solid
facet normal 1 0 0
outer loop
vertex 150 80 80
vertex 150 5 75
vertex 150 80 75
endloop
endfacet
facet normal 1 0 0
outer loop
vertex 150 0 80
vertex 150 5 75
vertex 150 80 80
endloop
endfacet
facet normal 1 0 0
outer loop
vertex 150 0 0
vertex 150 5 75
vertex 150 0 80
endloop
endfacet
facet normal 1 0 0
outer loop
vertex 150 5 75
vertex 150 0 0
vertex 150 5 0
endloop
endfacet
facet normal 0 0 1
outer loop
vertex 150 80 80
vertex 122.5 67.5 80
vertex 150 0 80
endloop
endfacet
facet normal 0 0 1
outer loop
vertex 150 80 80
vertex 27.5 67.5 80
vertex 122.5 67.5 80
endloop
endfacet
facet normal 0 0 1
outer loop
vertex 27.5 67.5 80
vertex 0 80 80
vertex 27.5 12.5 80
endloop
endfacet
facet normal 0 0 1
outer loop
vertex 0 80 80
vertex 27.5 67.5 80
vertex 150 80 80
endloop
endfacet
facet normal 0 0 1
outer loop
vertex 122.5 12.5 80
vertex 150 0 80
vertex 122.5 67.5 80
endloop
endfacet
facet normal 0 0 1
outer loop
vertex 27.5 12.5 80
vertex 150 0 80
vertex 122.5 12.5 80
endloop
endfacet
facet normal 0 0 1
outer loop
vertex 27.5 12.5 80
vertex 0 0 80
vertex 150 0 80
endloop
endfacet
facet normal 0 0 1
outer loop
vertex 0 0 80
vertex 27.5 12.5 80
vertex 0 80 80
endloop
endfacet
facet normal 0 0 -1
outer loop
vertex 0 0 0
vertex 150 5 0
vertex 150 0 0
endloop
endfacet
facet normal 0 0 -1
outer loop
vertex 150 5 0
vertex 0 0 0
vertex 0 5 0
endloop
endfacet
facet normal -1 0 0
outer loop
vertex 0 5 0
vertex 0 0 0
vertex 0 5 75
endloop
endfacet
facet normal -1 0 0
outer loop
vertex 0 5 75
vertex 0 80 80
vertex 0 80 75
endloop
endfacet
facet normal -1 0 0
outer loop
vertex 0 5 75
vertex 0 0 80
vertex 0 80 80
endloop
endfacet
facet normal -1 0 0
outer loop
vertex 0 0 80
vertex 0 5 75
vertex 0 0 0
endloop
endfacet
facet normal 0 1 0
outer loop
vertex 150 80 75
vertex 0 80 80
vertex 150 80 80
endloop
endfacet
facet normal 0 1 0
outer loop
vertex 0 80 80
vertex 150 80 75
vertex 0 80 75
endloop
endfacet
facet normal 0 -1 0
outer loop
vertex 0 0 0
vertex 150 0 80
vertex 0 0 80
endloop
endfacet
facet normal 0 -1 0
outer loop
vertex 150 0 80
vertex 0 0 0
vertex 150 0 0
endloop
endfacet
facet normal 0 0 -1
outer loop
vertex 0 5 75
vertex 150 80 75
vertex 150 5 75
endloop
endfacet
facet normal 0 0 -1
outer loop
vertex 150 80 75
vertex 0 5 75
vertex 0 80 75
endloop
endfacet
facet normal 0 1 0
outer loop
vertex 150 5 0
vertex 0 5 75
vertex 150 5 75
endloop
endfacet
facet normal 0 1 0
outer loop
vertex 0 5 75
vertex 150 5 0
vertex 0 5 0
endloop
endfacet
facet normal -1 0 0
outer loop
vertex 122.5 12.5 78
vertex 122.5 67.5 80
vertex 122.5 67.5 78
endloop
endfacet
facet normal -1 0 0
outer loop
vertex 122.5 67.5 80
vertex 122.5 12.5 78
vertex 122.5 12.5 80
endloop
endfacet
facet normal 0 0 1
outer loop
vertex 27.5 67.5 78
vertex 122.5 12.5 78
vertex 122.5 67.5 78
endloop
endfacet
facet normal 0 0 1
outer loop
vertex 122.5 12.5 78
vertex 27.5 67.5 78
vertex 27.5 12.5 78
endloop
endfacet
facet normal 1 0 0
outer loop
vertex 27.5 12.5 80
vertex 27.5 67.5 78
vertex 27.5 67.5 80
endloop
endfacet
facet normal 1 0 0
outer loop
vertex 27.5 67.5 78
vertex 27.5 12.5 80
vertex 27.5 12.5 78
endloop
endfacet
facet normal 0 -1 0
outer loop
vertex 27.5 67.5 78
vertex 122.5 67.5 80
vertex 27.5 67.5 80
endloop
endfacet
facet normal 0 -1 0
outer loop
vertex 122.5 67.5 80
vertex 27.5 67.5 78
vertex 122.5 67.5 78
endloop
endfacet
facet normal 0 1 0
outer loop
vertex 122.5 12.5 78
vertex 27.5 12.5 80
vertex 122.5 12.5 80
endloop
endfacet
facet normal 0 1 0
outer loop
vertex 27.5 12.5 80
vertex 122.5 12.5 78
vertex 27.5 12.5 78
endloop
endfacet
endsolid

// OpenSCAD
BoxH=80;
BoxW=150;
BoxD=80;
cutH=BoxH+10;
cutW=BoxW+10;
cutD=BoxD+10;
slotH=3;
slotW=95;
slotD=55;

difference()
{
  cube([BoxW,BoxD,BoxH]);
  translate([-5,5,-15]) cube([cutW,cutD,cutH]);
  translate([(BoxW/2)-(slotW/2),(BoxD/2)-(slotD/2),BoxH-slotH+1]) cube([slotW,slotD,slotH]);
}
